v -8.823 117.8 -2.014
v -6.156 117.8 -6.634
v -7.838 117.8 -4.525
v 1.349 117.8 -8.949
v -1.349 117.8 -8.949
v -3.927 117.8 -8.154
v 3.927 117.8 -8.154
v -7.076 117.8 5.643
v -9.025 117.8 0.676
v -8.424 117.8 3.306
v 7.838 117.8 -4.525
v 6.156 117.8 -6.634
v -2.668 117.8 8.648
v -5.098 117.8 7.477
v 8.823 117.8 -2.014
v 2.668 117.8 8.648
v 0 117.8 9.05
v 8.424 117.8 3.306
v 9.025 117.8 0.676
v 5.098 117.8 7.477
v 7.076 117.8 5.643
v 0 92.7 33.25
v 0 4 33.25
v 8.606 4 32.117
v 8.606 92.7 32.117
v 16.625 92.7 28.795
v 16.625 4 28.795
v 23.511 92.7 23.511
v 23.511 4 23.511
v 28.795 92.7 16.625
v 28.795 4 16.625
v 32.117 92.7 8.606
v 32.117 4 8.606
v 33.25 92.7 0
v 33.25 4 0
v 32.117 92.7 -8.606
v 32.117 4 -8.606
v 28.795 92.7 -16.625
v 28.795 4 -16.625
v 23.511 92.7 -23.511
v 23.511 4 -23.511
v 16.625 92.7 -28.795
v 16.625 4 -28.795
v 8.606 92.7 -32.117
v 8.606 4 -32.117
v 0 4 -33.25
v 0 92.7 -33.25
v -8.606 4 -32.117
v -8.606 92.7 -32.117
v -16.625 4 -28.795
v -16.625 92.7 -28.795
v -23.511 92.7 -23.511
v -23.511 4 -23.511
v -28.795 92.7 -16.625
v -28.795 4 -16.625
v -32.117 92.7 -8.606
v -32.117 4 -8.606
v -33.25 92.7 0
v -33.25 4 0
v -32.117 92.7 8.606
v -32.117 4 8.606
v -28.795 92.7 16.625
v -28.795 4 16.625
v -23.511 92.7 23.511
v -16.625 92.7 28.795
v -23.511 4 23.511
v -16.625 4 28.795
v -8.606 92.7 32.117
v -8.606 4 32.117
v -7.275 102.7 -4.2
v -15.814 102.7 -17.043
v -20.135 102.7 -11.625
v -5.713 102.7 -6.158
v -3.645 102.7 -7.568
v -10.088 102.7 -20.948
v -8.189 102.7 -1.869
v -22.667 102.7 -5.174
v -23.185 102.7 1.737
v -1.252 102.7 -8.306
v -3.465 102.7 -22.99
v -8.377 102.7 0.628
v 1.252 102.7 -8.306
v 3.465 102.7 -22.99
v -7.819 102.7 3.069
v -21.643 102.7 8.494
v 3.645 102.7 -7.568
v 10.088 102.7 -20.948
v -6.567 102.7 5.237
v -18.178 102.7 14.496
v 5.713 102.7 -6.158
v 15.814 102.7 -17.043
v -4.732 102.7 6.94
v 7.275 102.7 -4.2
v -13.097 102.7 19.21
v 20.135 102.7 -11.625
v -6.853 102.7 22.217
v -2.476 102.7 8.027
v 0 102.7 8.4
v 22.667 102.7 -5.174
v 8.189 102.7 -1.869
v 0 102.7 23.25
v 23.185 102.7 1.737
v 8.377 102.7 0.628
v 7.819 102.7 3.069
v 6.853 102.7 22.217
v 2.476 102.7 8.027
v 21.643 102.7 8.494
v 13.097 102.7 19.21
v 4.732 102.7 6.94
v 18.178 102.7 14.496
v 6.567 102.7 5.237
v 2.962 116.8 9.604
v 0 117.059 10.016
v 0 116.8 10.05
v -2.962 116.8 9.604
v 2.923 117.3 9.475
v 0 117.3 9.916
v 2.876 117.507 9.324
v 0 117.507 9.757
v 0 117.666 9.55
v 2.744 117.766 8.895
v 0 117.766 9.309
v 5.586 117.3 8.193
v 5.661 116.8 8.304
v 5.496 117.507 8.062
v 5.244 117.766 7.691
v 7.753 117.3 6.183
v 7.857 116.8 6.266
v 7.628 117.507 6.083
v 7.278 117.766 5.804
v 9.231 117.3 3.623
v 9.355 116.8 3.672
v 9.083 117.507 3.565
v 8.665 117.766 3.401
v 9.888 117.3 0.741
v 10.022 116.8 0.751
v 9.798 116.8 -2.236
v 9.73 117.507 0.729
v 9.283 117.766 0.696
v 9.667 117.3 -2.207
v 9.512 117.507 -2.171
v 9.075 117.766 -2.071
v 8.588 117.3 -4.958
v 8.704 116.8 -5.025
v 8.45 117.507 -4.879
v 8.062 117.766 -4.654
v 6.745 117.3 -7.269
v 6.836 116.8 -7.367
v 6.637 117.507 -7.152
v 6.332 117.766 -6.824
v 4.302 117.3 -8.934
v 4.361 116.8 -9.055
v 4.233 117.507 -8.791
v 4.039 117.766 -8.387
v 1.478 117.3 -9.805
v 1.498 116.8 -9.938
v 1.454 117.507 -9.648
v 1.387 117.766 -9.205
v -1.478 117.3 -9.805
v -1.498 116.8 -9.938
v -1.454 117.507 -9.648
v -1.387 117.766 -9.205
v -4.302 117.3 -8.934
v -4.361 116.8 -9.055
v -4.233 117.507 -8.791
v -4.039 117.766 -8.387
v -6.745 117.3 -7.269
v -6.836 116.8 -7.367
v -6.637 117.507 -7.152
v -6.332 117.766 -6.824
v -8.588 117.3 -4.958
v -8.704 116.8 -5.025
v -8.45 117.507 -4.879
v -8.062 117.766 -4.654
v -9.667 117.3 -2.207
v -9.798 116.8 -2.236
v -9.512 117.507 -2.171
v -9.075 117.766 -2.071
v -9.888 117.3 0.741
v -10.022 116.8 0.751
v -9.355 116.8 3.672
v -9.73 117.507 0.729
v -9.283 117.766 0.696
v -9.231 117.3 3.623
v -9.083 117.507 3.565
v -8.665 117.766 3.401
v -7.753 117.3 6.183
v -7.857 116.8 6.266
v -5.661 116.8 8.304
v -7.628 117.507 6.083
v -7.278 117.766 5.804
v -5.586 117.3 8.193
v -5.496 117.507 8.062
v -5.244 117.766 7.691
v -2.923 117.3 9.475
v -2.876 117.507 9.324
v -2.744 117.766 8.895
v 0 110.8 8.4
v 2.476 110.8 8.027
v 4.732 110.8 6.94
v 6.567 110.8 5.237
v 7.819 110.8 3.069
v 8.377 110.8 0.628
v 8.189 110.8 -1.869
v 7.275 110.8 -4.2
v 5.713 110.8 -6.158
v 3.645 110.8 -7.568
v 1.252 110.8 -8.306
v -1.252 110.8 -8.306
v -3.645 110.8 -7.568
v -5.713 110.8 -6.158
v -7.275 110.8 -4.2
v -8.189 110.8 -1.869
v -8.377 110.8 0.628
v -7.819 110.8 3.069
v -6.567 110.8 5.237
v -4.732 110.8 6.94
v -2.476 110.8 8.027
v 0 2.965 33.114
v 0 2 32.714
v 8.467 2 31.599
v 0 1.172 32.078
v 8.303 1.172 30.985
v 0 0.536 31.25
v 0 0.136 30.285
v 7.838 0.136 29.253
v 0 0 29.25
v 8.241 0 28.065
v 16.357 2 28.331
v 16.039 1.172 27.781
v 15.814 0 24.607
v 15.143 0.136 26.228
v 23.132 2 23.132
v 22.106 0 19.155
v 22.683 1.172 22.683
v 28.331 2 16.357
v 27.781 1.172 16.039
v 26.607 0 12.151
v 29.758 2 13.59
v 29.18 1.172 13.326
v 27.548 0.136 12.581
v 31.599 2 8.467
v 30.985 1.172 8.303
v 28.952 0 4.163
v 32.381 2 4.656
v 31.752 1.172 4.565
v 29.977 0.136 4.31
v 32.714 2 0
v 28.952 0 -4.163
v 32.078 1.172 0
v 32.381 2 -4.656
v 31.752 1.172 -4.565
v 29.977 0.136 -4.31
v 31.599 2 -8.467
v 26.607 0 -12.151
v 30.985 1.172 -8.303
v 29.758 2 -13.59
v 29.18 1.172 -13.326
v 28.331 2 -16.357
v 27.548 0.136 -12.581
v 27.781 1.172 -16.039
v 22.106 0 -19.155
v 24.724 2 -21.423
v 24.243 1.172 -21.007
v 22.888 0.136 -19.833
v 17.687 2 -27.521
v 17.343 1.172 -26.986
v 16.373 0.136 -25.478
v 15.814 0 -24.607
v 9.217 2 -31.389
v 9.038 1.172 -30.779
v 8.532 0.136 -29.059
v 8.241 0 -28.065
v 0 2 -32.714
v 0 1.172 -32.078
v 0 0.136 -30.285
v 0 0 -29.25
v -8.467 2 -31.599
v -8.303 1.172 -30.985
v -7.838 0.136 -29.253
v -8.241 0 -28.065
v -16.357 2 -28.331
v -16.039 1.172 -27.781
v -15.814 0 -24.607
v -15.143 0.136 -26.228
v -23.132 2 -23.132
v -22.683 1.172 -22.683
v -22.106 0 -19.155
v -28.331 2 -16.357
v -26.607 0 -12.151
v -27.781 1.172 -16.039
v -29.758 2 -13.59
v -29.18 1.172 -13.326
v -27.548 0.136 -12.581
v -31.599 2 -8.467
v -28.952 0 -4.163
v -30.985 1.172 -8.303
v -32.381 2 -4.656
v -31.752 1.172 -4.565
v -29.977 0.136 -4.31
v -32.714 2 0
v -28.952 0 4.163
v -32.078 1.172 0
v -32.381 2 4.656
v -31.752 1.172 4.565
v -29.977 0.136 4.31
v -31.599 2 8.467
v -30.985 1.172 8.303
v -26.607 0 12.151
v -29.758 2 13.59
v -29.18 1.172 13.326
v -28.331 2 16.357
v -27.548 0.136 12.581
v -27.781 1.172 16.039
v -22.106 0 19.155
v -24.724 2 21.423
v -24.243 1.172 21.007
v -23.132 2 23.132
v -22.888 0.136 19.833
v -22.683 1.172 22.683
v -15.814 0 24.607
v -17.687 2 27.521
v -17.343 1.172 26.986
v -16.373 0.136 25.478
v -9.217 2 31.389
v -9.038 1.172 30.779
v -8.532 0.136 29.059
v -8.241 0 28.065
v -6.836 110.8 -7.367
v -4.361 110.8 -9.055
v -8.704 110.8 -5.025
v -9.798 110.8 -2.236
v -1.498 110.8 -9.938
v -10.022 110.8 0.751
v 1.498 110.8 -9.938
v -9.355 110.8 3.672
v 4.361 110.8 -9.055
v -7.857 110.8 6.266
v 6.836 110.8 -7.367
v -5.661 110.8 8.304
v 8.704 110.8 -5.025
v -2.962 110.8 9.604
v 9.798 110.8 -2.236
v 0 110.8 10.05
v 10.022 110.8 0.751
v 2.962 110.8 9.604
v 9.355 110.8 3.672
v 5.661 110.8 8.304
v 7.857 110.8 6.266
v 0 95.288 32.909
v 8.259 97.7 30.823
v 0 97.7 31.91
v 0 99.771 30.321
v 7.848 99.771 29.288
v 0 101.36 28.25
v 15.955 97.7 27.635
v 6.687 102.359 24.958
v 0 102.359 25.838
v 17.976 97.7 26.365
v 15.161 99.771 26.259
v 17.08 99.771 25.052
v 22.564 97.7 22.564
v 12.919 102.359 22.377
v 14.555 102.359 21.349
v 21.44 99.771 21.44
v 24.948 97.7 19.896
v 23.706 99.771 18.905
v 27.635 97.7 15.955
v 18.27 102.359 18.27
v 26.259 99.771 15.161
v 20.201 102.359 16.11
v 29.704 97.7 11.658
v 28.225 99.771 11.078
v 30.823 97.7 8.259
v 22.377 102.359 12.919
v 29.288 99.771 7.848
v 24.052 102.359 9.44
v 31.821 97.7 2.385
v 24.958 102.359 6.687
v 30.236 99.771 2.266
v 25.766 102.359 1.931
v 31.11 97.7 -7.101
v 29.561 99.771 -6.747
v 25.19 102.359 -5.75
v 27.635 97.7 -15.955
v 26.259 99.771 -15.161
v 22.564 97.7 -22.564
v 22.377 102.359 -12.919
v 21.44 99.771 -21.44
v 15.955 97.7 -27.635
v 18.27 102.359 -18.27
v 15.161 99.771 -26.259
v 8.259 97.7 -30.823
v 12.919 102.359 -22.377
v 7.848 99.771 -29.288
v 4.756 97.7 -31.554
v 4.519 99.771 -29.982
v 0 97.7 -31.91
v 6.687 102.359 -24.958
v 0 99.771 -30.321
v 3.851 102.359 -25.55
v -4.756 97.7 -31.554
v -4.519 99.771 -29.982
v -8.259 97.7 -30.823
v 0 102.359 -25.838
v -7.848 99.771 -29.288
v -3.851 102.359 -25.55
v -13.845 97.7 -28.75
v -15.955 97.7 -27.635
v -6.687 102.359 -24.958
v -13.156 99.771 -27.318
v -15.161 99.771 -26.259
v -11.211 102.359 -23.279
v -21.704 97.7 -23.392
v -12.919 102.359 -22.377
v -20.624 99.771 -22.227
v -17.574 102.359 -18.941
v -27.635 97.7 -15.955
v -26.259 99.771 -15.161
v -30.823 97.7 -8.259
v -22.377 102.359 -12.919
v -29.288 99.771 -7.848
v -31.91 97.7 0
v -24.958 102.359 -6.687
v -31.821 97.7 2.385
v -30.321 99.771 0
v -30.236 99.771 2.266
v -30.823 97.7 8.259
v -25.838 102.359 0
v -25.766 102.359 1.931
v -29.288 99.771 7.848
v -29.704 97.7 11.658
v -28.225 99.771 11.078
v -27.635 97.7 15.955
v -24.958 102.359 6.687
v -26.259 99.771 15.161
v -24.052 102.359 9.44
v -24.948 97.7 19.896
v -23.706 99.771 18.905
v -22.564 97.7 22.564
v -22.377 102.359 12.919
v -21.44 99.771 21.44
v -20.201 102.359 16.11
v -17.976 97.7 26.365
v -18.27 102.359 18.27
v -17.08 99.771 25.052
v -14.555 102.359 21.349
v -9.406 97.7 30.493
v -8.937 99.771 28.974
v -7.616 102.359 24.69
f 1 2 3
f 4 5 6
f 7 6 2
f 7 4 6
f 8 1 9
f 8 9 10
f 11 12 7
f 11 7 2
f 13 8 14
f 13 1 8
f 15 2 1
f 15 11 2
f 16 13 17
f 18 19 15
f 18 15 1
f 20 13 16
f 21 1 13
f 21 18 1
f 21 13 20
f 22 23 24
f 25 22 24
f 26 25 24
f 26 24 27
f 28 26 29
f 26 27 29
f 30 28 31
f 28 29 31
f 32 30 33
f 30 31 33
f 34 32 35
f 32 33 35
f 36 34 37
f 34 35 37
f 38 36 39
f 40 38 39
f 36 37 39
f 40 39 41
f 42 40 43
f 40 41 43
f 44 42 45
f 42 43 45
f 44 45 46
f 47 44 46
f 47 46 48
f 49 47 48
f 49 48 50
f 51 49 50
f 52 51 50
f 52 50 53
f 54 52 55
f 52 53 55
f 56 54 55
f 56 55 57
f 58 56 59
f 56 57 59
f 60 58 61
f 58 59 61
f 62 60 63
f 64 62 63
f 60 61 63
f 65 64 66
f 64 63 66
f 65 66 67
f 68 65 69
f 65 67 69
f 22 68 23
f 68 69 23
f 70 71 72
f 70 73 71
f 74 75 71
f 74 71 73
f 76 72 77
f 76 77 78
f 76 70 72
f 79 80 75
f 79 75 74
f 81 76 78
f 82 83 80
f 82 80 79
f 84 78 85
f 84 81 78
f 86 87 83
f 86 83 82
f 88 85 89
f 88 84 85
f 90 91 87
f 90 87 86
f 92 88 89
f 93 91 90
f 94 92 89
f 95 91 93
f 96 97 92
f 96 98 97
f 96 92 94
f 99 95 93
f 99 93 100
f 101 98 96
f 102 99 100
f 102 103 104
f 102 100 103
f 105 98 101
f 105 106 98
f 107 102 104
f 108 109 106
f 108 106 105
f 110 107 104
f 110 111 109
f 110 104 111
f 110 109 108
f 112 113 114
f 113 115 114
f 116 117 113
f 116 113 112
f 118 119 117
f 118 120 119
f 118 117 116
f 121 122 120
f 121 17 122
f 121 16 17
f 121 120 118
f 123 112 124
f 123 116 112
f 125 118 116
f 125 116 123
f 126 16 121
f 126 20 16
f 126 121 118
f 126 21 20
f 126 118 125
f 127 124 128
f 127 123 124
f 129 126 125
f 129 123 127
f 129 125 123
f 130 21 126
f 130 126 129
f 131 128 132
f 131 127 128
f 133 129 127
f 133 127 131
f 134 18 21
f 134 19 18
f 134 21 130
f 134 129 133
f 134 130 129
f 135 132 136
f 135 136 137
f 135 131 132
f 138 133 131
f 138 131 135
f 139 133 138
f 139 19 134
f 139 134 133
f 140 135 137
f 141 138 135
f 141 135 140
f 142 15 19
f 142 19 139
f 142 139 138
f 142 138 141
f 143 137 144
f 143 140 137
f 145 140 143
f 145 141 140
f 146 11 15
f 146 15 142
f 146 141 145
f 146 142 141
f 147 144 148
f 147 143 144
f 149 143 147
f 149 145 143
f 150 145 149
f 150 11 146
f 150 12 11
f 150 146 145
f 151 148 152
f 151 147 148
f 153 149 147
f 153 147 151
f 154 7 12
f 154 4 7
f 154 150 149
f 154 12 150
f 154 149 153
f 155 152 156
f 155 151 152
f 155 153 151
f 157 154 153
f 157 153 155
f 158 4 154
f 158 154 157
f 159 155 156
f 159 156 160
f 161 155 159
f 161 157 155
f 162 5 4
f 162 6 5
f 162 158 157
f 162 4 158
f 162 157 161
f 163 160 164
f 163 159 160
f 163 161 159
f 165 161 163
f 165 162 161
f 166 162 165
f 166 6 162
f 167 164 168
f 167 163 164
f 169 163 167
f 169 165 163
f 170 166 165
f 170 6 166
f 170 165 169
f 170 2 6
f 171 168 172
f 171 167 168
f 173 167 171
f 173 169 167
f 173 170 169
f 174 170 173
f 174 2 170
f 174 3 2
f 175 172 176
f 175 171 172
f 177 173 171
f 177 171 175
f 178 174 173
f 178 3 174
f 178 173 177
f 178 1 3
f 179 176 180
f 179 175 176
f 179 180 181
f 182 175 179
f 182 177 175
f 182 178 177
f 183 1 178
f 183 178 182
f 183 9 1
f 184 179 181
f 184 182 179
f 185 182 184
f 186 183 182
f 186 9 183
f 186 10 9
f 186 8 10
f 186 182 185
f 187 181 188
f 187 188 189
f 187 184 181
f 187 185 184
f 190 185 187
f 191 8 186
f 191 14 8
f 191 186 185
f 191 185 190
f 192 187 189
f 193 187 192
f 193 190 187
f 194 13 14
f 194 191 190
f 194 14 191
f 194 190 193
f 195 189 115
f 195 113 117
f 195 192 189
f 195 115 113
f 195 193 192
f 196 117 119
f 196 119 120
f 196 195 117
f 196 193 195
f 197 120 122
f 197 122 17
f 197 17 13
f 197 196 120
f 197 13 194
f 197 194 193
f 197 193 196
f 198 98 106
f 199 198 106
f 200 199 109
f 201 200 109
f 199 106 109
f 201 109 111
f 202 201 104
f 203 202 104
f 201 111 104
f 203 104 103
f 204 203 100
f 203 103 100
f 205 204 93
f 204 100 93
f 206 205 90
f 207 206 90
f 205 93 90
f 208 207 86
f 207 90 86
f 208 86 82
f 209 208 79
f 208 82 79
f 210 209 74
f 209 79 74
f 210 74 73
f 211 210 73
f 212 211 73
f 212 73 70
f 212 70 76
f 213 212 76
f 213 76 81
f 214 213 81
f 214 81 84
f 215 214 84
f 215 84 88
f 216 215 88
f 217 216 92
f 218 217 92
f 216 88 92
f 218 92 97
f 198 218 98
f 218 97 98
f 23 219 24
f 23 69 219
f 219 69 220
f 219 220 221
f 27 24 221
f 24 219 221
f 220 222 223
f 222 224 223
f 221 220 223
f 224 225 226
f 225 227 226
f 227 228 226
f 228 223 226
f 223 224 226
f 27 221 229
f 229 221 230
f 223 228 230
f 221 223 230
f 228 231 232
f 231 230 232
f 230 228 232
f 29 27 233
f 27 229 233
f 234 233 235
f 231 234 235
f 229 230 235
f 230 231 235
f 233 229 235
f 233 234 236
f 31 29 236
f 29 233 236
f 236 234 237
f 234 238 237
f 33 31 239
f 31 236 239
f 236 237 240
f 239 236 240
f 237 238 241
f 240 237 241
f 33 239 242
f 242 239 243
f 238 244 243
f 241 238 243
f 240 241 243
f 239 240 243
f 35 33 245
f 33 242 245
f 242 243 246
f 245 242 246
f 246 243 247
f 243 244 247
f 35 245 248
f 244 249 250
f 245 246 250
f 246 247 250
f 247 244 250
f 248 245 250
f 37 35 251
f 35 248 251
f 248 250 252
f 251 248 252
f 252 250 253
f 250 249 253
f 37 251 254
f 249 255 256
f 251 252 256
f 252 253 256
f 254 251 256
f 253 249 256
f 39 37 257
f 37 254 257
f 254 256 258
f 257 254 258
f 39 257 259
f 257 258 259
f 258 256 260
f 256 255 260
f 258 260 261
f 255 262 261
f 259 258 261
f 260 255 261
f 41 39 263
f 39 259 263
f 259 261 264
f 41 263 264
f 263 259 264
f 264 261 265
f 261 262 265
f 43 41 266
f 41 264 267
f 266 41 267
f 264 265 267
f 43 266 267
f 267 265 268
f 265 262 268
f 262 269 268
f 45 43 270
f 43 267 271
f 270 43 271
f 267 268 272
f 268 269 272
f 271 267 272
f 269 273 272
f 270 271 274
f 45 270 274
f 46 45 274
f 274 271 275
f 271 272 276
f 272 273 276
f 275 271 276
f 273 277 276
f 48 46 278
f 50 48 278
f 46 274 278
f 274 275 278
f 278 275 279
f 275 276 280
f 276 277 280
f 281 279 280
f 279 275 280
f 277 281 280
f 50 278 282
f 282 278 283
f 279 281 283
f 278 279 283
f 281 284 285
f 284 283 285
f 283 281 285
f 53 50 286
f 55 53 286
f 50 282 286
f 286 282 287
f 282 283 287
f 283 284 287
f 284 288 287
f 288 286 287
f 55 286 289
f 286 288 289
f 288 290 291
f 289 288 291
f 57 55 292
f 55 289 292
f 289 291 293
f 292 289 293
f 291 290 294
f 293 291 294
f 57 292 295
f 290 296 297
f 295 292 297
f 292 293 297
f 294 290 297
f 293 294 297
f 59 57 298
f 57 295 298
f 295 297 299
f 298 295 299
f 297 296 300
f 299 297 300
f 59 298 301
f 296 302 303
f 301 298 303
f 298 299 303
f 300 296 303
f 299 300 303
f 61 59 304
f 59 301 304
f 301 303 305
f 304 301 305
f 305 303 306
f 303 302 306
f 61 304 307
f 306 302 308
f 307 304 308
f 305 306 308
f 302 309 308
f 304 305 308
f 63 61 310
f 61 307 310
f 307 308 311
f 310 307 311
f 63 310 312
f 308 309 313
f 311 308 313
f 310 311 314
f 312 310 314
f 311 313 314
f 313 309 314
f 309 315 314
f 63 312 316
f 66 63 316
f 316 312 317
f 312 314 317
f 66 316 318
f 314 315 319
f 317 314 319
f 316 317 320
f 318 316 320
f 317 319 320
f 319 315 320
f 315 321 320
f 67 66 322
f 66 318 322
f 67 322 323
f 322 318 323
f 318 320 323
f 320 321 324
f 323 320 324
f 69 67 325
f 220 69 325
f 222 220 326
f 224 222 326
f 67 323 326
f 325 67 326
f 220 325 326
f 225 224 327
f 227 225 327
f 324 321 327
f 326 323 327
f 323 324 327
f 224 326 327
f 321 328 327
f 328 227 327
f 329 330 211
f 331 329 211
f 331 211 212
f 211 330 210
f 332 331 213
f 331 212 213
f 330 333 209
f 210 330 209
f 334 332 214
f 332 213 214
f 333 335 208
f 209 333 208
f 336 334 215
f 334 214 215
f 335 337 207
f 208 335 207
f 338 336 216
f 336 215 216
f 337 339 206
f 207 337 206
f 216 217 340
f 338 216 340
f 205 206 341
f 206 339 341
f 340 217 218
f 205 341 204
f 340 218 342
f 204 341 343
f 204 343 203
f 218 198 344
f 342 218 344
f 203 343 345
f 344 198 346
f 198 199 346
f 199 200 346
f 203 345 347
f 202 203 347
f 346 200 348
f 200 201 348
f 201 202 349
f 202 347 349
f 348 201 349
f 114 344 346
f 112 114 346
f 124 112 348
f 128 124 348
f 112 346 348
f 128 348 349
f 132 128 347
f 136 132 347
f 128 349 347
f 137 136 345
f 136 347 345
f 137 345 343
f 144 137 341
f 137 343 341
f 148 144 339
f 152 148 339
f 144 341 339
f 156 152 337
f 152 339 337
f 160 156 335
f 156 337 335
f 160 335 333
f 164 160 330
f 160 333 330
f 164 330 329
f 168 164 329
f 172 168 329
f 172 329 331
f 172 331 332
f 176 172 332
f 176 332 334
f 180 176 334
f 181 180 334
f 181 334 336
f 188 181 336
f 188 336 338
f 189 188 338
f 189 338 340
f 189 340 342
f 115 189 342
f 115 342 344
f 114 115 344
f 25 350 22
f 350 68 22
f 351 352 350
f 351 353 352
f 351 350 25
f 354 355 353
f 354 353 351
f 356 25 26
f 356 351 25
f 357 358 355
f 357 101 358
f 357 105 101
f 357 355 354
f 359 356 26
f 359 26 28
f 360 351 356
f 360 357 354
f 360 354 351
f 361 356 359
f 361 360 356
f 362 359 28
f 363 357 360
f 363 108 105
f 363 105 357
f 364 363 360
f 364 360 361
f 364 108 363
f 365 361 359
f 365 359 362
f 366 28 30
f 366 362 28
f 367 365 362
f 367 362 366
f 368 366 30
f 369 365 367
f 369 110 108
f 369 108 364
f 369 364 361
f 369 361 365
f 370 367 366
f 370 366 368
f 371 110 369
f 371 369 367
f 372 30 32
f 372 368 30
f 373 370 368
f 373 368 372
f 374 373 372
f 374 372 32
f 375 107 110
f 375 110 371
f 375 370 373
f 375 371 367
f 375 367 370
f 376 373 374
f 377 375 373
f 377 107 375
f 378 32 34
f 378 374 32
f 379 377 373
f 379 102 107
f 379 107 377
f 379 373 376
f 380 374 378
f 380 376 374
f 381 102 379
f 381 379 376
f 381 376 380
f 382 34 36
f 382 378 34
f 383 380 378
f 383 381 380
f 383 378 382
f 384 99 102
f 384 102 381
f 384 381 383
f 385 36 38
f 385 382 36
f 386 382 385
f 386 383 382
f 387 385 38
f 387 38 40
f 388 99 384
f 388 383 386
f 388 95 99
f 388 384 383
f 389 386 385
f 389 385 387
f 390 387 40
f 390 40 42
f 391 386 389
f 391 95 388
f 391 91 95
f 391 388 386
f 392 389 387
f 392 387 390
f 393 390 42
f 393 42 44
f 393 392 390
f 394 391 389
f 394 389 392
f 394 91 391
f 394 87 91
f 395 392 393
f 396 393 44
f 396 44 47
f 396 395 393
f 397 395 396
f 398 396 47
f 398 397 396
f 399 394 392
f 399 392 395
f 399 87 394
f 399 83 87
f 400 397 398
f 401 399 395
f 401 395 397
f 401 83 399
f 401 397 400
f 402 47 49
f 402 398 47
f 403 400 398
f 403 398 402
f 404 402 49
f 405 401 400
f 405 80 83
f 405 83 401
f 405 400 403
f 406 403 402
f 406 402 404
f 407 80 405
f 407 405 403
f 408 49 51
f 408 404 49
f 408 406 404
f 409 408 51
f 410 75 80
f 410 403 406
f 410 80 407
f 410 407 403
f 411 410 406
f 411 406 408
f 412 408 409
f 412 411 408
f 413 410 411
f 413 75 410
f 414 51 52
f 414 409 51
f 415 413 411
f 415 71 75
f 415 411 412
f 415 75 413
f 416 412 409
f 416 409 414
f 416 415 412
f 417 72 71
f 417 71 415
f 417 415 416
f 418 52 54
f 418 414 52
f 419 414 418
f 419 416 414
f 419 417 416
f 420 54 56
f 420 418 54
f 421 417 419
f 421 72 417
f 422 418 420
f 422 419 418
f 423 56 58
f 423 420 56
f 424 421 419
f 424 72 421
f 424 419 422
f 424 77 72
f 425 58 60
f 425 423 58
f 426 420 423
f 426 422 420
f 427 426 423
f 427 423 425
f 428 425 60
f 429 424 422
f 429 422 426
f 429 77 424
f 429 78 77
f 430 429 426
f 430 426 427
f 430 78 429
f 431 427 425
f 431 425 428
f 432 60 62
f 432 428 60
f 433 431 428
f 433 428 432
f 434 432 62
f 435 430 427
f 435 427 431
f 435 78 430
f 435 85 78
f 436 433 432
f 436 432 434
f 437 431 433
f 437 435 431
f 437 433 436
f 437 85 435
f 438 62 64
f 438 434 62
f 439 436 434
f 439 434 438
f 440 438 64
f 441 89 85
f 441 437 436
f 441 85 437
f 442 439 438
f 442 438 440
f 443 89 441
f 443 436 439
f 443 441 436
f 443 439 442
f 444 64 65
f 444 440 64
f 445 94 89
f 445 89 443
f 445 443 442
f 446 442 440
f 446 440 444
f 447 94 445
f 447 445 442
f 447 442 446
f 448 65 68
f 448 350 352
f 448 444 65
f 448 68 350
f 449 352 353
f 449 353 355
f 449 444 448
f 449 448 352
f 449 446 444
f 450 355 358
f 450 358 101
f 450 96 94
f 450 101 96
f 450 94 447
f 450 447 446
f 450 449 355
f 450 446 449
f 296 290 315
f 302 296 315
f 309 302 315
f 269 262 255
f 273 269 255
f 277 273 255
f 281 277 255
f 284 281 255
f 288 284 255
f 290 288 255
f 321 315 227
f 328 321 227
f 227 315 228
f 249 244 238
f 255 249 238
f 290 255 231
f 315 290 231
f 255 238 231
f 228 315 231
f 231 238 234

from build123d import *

# Parameters (mm, degrees)
SKETCH1_R           = 33.25
BOSS_EXTRUDE1_DEPTH = 102.7
SKETCH2_R           = 10.05
BOSS_EXTRUDE2_DEPTH = 15.1
FILLET1_R           = 4
FILLET2_R           = 10
FILLET3_R           = 1
SKETCH4_R           = 10.05
SKETCH4_R_2         = 8.4
CUT_EXTRUDE1_DEPTH  = 8.1


with BuildPart() as part:
    # Sketch1 → Boss-Extrude1 (new body)
    with BuildSketch(Plane(origin=(0, 0, 0), x_dir=(1, 0, 0), z_dir=(0, 1, 0))):
        with Locations(Location((0, 0, 0), (0, 0, 270))):
            Circle(SKETCH1_R)
    extrude(amount=BOSS_EXTRUDE1_DEPTH)

    # Sketch2 → Boss-Extrude2 (add)
    with BuildSketch(Plane(origin=(0, 102.7, 0), x_dir=(1, 0, 0), z_dir=(0, 1, 0))):
        with Locations(Location((0, 0, 0), (0, 0, 270))):
            Circle(SKETCH2_R)
    extrude(amount=BOSS_EXTRUDE2_DEPTH)

    # Fillet1
    fillet1_edges = [part.edges().sort_by_distance(p)[0] for p in [
        (0, 0, -33.25),
    ]]
    fillet(fillet1_edges, radius=FILLET1_R)

    # Fillet2
    fillet2_edges = [part.edges().sort_by_distance(p)[0] for p in [
        (0, 102.7, -33.25),
    ]]
    fillet(fillet2_edges, radius=FILLET2_R)

    # Fillet3
    fillet3_edges = [part.edges().sort_by_distance(p)[0] for p in [
        (0, 117.8, -10.05),
    ]]
    fillet(fillet3_edges, radius=FILLET3_R)

    # Sketch4 → Cut-Extrude1 (cut)
    with BuildSketch(Plane(origin=(0, 102.7, 0), x_dir=(1, 0, 0), z_dir=(0, 1, 0))):
        with Locations(Location((0, 0, 0), (0, 0, 270))):
            Circle(SKETCH4_R)
        with Locations(Location((0, 0, 0), (0, 0, 270))):
            Circle(SKETCH4_R_2, mode=Mode.SUBTRACT)
    extrude(amount=CUT_EXTRUDE1_DEPTH, mode=Mode.SUBTRACT)


solid = part.part
